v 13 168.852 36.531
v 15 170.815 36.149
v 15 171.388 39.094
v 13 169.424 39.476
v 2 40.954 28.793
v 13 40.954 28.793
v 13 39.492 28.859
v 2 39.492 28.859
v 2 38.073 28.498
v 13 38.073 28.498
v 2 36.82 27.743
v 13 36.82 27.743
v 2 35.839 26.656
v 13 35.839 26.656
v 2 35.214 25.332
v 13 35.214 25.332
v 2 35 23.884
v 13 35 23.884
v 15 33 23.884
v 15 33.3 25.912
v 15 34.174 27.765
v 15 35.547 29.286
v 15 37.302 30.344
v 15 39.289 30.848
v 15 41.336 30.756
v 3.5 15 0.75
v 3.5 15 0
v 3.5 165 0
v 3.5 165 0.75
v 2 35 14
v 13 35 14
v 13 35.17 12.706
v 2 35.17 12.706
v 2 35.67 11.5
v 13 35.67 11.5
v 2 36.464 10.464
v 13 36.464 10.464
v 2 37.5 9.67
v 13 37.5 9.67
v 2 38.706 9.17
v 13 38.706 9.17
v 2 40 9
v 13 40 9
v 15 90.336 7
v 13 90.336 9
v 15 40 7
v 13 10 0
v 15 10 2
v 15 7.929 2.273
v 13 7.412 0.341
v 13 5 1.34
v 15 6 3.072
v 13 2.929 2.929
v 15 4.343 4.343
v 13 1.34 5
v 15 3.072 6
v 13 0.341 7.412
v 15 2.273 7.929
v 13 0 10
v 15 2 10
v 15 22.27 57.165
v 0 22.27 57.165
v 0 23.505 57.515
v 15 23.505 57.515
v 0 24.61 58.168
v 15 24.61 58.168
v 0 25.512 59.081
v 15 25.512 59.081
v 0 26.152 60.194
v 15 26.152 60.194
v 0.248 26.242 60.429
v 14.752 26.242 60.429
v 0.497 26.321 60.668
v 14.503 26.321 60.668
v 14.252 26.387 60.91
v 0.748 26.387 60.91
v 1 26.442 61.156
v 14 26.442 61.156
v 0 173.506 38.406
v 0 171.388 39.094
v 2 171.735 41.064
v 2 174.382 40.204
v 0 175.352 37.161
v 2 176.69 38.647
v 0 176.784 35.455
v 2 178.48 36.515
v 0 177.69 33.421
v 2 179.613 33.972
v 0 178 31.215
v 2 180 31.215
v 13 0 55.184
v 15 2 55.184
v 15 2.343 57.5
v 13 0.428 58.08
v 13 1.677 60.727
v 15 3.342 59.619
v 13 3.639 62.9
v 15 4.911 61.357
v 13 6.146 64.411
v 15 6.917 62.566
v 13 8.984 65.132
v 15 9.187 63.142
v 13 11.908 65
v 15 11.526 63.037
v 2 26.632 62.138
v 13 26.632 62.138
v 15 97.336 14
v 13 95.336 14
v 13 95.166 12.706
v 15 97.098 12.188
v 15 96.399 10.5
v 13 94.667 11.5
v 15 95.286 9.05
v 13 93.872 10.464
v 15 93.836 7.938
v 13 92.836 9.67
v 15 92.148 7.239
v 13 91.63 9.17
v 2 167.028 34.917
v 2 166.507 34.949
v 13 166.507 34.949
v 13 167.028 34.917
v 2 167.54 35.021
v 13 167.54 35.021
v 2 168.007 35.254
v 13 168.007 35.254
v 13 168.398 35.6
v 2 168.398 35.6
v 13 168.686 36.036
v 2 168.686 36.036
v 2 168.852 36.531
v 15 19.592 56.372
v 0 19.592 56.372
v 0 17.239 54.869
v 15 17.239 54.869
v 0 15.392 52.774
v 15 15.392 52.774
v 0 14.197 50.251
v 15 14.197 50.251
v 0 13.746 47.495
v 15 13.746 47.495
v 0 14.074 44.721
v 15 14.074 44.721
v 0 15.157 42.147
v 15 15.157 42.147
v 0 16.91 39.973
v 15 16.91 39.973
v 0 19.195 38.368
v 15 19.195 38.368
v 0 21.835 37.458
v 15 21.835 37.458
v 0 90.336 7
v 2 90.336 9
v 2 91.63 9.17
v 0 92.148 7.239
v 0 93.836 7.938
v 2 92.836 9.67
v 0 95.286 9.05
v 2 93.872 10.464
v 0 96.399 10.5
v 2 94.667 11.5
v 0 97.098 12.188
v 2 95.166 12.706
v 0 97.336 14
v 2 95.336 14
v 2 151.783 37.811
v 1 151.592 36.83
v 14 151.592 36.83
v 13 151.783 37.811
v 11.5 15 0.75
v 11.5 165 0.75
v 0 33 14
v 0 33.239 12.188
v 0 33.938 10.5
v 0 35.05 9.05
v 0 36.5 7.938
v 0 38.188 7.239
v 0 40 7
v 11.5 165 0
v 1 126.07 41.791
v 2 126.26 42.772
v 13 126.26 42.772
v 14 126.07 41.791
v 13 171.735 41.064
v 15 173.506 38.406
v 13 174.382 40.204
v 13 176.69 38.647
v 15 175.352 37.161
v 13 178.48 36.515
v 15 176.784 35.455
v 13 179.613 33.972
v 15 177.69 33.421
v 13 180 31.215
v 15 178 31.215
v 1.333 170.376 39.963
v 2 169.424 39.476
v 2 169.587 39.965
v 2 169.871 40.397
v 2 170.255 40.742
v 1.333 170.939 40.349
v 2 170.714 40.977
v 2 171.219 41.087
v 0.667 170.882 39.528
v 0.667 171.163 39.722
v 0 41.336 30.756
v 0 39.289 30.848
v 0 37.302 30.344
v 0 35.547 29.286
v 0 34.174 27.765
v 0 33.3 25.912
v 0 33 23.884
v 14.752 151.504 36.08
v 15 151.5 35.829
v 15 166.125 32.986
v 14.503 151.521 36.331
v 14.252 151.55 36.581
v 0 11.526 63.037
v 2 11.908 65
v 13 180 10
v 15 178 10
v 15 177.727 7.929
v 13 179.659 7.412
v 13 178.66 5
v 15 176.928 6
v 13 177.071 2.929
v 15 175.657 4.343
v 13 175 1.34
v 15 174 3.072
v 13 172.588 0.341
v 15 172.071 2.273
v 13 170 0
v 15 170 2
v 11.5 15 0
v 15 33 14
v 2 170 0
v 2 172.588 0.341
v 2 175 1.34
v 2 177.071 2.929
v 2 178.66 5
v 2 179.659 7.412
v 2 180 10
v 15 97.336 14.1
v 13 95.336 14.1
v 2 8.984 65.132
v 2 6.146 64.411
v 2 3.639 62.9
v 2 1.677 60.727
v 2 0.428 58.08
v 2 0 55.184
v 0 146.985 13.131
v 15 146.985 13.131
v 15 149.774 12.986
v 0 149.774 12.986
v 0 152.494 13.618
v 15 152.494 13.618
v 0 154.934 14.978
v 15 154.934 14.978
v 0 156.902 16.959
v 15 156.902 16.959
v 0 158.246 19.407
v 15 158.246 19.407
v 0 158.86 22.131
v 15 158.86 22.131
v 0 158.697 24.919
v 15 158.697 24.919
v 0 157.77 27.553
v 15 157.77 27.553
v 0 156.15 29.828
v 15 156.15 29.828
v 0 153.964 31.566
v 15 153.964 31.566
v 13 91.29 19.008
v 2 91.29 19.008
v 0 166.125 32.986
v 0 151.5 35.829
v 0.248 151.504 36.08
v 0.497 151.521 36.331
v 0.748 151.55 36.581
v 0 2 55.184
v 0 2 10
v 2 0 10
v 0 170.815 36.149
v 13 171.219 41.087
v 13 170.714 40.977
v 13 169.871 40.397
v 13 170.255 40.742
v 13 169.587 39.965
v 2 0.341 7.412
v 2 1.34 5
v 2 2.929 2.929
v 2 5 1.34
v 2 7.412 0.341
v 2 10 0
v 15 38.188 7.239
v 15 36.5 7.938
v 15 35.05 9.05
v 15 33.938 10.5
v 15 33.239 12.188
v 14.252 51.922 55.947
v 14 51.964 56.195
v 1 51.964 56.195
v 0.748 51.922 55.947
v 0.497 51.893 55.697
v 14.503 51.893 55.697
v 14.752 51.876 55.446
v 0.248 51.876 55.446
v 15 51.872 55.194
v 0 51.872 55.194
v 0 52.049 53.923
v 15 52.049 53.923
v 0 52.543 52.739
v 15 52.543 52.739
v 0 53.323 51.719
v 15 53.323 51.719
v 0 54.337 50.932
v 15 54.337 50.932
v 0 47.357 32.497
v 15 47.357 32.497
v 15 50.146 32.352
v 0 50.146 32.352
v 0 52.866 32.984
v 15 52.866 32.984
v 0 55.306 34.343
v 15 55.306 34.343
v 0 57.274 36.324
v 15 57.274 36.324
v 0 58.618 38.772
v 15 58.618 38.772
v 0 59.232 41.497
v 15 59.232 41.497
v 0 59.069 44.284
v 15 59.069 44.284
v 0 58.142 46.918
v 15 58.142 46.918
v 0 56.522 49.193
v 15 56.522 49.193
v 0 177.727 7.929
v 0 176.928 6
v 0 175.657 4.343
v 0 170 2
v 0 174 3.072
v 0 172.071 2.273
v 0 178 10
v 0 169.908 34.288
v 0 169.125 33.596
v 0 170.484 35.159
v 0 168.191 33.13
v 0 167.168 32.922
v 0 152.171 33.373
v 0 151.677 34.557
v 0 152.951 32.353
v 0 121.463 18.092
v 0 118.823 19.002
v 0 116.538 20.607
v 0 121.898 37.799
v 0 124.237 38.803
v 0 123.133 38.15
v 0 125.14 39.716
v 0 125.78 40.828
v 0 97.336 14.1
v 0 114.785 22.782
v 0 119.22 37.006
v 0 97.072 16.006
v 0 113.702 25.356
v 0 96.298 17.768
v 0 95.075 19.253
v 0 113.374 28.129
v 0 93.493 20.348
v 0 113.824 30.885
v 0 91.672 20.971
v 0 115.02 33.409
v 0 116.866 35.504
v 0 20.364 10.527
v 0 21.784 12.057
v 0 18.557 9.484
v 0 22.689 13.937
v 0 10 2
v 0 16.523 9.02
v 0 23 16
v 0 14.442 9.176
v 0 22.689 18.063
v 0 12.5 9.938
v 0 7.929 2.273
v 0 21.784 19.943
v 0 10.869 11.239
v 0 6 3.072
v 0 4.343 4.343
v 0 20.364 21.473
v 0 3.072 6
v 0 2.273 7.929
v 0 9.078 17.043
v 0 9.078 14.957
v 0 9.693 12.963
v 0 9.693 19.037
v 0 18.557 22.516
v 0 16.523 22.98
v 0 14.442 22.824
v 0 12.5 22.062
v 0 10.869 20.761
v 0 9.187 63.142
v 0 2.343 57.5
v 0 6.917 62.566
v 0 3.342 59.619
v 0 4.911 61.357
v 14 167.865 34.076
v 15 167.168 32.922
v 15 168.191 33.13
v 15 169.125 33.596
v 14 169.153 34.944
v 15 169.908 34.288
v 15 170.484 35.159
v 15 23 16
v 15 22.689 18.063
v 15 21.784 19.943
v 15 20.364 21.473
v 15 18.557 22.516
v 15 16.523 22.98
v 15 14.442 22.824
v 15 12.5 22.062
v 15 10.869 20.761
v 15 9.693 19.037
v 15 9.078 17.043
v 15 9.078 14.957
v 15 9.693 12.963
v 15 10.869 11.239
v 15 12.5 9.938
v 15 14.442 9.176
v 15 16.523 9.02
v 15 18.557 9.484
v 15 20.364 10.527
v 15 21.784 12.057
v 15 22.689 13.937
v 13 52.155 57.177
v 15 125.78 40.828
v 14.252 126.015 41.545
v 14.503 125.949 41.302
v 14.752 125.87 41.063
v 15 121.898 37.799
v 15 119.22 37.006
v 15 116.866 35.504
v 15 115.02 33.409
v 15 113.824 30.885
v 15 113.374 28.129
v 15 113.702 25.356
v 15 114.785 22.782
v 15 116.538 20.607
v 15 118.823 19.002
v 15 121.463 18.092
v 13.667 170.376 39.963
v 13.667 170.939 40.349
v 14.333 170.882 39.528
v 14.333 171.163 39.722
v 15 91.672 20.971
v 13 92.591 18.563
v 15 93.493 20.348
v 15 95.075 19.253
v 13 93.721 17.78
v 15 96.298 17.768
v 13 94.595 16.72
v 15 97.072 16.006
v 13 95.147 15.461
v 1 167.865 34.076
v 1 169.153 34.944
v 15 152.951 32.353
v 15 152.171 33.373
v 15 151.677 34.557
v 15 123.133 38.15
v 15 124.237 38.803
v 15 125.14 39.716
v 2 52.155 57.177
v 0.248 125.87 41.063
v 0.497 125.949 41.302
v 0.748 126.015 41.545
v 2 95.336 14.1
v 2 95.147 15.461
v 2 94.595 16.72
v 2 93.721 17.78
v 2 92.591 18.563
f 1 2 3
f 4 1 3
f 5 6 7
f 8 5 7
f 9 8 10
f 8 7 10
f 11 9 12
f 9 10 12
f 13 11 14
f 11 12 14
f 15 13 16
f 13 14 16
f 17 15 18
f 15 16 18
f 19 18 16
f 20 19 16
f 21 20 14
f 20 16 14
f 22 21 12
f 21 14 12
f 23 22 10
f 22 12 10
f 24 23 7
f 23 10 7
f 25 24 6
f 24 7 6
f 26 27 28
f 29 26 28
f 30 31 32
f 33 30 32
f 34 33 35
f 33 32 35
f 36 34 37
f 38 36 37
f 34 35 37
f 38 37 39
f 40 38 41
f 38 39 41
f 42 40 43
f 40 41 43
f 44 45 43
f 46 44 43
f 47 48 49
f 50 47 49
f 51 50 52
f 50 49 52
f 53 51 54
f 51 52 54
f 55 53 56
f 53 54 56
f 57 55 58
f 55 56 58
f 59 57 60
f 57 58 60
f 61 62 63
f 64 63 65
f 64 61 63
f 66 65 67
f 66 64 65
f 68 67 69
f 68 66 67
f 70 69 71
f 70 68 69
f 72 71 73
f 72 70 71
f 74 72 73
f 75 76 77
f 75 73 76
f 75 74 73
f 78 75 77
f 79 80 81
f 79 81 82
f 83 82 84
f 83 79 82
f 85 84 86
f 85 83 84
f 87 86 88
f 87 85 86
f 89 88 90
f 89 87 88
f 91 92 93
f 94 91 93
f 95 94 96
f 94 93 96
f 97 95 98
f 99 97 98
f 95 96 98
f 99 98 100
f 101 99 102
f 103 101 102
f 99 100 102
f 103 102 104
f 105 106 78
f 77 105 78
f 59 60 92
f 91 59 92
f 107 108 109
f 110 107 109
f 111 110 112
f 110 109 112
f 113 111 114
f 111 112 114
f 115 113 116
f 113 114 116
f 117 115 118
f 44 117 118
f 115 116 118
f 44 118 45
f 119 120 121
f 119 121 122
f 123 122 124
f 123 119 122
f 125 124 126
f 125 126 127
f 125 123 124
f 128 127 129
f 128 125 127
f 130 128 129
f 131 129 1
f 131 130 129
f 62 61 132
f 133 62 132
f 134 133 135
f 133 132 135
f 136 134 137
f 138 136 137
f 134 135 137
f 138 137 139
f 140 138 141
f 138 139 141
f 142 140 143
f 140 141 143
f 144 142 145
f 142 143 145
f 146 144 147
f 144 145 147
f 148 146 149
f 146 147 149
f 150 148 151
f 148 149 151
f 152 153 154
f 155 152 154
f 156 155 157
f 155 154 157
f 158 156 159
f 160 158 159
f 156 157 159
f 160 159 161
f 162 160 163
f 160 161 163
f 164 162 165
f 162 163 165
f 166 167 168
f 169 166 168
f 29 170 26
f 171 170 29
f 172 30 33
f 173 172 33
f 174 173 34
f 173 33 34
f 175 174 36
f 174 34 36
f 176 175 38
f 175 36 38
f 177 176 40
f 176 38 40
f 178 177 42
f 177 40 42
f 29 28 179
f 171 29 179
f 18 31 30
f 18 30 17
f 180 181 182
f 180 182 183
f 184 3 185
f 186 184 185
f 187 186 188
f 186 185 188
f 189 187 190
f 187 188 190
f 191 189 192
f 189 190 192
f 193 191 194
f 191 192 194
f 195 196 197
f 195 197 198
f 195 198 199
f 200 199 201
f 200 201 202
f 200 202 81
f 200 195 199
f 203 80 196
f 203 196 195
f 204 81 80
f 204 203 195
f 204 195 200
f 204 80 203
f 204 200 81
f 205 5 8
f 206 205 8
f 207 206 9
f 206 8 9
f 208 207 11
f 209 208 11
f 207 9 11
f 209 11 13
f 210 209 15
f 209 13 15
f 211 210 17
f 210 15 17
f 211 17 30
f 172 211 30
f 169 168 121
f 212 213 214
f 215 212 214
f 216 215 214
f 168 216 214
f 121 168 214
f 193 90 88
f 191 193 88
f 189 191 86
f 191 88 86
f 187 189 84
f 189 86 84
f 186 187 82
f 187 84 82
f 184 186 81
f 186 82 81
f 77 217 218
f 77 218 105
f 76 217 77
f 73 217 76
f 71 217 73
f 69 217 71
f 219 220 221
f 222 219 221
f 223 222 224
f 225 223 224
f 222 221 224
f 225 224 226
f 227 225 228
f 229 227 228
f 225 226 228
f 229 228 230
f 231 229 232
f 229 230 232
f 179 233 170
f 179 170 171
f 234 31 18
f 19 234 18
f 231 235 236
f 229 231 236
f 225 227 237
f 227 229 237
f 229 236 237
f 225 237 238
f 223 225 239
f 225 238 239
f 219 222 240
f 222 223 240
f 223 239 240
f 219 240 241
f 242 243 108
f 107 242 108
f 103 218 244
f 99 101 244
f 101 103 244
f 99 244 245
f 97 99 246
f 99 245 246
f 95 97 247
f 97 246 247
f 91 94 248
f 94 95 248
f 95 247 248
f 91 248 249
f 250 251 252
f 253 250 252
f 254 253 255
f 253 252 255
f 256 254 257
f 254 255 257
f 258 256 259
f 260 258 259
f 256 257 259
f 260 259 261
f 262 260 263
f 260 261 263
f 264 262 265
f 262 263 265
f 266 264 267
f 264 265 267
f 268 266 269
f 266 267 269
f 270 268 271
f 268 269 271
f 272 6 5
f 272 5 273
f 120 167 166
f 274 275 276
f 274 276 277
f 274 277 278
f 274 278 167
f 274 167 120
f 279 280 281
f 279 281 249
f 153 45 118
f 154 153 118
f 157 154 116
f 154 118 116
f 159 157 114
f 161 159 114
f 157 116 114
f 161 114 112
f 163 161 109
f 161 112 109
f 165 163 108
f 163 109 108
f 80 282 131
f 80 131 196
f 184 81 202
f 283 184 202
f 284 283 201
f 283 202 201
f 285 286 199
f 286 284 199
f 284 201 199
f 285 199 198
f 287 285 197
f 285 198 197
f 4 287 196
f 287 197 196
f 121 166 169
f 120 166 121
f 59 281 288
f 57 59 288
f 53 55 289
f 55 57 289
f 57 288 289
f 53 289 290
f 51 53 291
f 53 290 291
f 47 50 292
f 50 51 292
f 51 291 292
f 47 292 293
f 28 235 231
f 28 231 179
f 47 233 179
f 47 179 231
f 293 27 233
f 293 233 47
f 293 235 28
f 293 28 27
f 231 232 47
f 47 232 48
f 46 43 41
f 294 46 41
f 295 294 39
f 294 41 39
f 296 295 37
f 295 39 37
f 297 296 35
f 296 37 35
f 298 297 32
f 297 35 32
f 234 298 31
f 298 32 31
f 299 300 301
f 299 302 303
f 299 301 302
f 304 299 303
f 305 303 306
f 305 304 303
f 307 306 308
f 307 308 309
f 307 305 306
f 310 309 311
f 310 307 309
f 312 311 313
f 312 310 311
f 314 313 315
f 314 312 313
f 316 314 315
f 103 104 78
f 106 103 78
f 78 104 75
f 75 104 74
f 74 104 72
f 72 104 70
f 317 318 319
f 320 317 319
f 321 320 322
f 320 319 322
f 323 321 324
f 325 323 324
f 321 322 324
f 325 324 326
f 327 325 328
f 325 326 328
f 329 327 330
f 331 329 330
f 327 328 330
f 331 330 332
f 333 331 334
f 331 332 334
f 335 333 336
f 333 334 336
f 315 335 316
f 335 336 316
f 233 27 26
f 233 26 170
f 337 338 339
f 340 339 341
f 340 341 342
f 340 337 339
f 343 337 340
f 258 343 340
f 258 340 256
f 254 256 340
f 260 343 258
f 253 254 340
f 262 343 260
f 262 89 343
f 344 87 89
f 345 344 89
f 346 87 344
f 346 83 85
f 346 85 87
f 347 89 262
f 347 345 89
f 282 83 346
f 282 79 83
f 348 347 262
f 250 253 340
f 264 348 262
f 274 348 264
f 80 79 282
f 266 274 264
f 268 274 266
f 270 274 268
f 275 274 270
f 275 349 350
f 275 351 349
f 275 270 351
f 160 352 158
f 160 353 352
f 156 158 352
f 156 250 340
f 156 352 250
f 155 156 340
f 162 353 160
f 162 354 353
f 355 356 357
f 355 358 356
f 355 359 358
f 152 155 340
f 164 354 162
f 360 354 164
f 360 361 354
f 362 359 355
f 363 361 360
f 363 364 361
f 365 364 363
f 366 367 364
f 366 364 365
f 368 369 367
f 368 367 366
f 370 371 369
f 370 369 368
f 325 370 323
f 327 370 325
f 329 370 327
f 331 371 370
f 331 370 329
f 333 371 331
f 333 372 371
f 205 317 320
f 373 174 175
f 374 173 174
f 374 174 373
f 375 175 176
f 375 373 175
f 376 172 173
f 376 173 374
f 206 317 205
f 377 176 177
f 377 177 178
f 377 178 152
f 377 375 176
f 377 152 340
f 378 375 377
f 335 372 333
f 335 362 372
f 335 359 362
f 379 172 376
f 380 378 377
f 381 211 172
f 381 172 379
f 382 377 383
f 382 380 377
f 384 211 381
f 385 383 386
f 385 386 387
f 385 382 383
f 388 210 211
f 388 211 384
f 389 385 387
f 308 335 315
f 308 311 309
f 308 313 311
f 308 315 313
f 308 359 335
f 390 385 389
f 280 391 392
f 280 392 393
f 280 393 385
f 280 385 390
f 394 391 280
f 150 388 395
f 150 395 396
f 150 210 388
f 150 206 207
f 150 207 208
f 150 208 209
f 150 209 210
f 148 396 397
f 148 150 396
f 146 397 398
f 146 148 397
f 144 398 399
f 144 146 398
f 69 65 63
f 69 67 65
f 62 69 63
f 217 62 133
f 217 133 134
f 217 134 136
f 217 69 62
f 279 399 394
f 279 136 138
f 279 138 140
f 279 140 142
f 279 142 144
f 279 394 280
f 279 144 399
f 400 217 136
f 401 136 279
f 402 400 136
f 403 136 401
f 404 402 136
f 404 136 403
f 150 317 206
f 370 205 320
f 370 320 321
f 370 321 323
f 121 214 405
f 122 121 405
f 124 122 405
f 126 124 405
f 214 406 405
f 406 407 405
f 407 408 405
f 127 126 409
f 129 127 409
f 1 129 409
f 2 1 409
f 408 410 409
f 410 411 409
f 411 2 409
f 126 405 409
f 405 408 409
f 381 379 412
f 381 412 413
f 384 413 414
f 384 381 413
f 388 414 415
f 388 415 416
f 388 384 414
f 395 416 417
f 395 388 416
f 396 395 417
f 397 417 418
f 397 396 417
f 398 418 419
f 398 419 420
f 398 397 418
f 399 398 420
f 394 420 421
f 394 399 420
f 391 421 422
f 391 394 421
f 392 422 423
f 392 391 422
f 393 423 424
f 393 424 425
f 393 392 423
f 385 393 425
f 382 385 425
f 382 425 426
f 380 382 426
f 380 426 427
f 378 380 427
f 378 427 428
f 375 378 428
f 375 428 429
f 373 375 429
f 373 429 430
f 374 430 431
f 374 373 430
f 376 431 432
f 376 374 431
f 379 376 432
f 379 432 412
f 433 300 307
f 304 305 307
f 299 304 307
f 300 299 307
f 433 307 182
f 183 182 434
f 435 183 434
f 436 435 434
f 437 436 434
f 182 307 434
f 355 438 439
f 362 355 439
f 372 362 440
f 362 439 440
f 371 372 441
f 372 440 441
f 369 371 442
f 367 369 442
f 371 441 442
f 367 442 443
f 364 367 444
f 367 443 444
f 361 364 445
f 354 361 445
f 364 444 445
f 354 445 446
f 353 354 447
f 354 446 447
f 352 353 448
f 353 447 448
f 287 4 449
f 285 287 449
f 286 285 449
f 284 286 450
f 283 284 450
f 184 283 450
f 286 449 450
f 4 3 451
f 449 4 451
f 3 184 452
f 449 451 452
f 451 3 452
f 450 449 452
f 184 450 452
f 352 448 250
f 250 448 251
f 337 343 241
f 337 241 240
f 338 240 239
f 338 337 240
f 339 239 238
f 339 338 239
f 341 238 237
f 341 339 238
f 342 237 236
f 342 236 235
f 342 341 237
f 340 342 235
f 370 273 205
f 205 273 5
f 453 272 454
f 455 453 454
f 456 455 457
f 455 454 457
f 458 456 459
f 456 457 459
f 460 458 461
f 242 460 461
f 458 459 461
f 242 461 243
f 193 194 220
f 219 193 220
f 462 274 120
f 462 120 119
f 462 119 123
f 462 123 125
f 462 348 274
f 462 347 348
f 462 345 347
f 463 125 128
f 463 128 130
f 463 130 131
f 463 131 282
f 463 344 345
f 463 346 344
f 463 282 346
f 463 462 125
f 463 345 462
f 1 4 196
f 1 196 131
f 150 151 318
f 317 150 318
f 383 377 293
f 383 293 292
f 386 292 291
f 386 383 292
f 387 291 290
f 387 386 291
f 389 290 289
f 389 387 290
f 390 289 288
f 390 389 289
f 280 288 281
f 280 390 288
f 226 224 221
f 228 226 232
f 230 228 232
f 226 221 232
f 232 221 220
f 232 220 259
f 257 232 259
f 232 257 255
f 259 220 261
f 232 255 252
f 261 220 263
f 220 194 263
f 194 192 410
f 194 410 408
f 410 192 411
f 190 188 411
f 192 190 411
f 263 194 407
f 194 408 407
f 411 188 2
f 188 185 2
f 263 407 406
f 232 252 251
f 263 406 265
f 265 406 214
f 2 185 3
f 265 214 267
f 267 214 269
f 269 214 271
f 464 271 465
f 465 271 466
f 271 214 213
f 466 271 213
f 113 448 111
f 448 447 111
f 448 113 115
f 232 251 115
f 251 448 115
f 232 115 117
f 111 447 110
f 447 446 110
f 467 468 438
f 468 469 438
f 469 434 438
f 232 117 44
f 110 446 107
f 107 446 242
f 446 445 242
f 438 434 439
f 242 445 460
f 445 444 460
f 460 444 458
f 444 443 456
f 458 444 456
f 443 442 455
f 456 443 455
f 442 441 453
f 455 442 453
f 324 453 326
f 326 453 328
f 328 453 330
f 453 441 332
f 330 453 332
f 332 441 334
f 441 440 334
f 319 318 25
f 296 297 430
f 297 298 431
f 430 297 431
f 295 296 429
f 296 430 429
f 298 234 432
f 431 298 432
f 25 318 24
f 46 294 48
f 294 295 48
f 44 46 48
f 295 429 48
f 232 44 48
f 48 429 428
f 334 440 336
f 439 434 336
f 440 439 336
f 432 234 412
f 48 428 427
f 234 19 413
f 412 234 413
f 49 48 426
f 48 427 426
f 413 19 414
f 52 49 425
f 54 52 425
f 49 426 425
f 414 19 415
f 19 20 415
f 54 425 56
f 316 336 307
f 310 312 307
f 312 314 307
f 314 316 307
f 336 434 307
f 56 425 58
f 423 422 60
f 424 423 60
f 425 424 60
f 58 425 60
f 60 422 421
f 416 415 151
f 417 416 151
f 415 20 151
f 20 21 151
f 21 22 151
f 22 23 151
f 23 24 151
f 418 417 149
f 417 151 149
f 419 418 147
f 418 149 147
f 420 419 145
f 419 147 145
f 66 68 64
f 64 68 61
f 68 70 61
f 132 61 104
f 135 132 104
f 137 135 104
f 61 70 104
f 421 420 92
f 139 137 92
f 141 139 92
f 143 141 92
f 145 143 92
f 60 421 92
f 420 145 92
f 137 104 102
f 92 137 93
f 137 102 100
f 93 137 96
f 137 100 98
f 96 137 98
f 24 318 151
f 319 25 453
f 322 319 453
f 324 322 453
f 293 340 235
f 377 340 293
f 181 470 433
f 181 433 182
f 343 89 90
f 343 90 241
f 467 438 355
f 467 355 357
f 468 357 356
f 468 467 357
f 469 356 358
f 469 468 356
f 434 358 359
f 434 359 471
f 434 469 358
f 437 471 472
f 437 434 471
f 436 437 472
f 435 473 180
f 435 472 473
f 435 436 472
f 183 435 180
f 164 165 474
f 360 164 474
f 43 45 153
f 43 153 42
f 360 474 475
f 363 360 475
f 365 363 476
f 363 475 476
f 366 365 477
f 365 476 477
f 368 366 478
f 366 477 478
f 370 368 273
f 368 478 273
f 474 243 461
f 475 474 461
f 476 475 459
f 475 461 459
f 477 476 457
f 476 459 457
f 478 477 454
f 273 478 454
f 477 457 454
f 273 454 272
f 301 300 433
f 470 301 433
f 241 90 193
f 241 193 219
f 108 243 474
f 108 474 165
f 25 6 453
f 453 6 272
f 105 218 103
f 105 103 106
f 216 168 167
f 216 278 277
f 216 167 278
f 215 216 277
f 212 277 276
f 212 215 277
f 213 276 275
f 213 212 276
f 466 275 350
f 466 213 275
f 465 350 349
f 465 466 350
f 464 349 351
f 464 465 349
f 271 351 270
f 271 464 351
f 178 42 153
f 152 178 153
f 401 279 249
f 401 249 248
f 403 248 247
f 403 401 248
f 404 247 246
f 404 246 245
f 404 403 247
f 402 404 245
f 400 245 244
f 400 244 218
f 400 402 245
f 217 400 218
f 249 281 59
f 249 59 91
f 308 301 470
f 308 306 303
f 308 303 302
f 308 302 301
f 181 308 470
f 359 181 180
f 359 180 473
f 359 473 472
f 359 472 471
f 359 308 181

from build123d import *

# Parameters (mm, degrees)
SKETCH_R        = 7
PAD_DEPTH       = 15
CHAMFER_SIZE    = 2
SKETCH003_W     = 150
SKETCH003_H     = 8
POCKET001_DEPTH = 0.75
POCKET002_DEPTH = 15.001
POCKET003_DEPTH = 15.001
CHAMFER002_SIZE = 2


with BuildPart() as part:
    # Sketch → Pad (new body)
    with BuildSketch(Plane.YZ):
        with BuildLine():
            Line((0, 10), (0, 55.1837281655))
            ThreePointArc((11.9080899538, 65), (3.6392177972, 62.8999739994), (0, 55.1837281655))
            Line((11.9080899538, 65), (166.5070947684, 34.9489976518))
            ThreePointArc((166.5070947684, 34.9489976518), (168.0070985661, 35.2541768735), (168.851967126, 36.5306340279))
            Line((169.4243941122, 39.4755155782), (168.851967126, 36.5306340279))
            ThreePointArc((171.7345605988, 41.063580806), (170.2546752416, 40.7420394634), (169.4243941122, 39.4755155782))
            ThreePointArc((180, 31.2151647136), (177.6598174256, 37.6437879725), (171.7345605988, 41.063580806))
            Line((180, 31.2151647136), (180, 10))
            ThreePointArc((170, 0), (177.0710678119, 2.9289321881), (180, 10))
            Line((170, 0), (10, 0))
            ThreePointArc((0, 10), (2.9289321881, 2.9289321881), (10, 0))
        make_face()
        with Locations((16, 16)):
            Circle(SKETCH_R, mode=Mode.SUBTRACT)
    extrude(amount=PAD_DEPTH)

    # Chamfer
    chamfer_edges = [part.edges().sort_by_distance(p)[0] for p in [
        (15, 90, 0),
        (0, 90, 0),
    ]]
    chamfer(chamfer_edges, length=CHAMFER_SIZE)

    # Sketch003 (on Face1 of Pad) → Pocket001 (cut)
    with BuildSketch(Plane.YX):
        with Locations((90, 7.5)):
            Rectangle(SKETCH003_W, SKETCH003_H)
    extrude(amount=-POCKET001_DEPTH, mode=Mode.SUBTRACT)

    # Sketch004 (on Face14 of Pad) → Pocket002 (cut, through all)
    with BuildSketch(Plane.YZ.offset(15)):
        with BuildLine():
            Line((21.8351520655, 37.4576612912), (47.3574588351, 32.4966274114))
            ThreePointArc((47.3574588351, 32.4966274114), (58.6177903834, 38.7723375448), (54.336603861, 50.9317391014))
            ThreePointArc((51.9639954797, 56.1952040061), (52.3138370776, 53.1864198979), (54.336603861, 50.9317391014))
            Line((51.9639954797, 56.1952040061), (52.1548044751, 57.1768311896))
            Line((52.1548044751, 57.1768311896), (26.6324977055, 62.1378650694))
            Line((26.6324977055, 62.1378650694), (26.4416887101, 61.1562378859))
            ThreePointArc((22.2701158683, 57.1648329504), (24.9902108638, 58.4975948081), (26.4416887101, 61.1562378859))
            ThreePointArc((22.2701158683, 57.1648329504), (13.7456768513, 47.4945928448), (21.8351520655, 37.4576612912))
        make_face()
        with BuildLine():
            Line((121.463034607, 18.091962684), (146.9853413767, 13.1309288042))
            ThreePointArc((146.9853413767, 13.1309288042), (158.2456729249, 19.4066389377), (153.9644864025, 31.5660404943))
            ThreePointArc((151.5918780213, 36.829505399), (151.9417196191, 33.8207212907), (153.9644864025, 31.5660404943))
            Line((151.5918780213, 36.829505399), (151.7826870167, 37.8111325824))
            Line((151.7826870167, 37.8111325824), (126.260380247, 42.7721664622))
            Line((126.260380247, 42.7721664622), (126.0695712516, 41.7905392787))
            ThreePointArc((121.8979984099, 37.7991343433), (124.6180934053, 39.1318962009), (126.0695712516, 41.7905392787))
            ThreePointArc((121.8979984099, 37.7991343433), (113.3735593928, 28.1288942377), (121.463034607, 18.091962684))
        make_face()
    extrude(amount=-POCKET002_DEPTH, mode=Mode.SUBTRACT)

    # Sketch005 (on Face14 of Pad) → Pocket003 (cut, through all)
    with BuildSketch(Plane.YZ.offset(15)):
        with BuildLine():
            Line((90.3363821208, 9), (40, 9))
            ThreePointArc((35, 14), (36.4644660941, 10.4644660941), (40, 9))
            Line((35, 14), (35, 23.8844015175))
            ThreePointArc((40.9540449769, 28.7925374348), (36.8196088986, 27.7425244345), (35, 23.8844015175))
            Line((40.9540449769, 28.7925374348), (91.2904270977, 19.0081359172))
            ThreePointArc((95.3363821208, 14.1), (94.1945050377, 17.2803911014), (91.2904270977, 19.0081359172))
            Line((95.3363821208, 14.1), (95.3363821208, 14))
            ThreePointArc((90.3363821208, 9), (93.8719160267, 10.4644660941), (95.3363821208, 14))
        make_face()
    extrude(amount=-POCKET003_DEPTH, mode=Mode.SUBTRACT)

    # Chamfer002
    chamfer002_edges = [part.edges().sort_by_distance(p)[0] for p in [
        (15, 66.122236, 23.900337),
        (0, 66.122236, 23.900337),
    ]]
    chamfer(chamfer002_edges, length=CHAMFER002_SIZE)


solid = part.part
